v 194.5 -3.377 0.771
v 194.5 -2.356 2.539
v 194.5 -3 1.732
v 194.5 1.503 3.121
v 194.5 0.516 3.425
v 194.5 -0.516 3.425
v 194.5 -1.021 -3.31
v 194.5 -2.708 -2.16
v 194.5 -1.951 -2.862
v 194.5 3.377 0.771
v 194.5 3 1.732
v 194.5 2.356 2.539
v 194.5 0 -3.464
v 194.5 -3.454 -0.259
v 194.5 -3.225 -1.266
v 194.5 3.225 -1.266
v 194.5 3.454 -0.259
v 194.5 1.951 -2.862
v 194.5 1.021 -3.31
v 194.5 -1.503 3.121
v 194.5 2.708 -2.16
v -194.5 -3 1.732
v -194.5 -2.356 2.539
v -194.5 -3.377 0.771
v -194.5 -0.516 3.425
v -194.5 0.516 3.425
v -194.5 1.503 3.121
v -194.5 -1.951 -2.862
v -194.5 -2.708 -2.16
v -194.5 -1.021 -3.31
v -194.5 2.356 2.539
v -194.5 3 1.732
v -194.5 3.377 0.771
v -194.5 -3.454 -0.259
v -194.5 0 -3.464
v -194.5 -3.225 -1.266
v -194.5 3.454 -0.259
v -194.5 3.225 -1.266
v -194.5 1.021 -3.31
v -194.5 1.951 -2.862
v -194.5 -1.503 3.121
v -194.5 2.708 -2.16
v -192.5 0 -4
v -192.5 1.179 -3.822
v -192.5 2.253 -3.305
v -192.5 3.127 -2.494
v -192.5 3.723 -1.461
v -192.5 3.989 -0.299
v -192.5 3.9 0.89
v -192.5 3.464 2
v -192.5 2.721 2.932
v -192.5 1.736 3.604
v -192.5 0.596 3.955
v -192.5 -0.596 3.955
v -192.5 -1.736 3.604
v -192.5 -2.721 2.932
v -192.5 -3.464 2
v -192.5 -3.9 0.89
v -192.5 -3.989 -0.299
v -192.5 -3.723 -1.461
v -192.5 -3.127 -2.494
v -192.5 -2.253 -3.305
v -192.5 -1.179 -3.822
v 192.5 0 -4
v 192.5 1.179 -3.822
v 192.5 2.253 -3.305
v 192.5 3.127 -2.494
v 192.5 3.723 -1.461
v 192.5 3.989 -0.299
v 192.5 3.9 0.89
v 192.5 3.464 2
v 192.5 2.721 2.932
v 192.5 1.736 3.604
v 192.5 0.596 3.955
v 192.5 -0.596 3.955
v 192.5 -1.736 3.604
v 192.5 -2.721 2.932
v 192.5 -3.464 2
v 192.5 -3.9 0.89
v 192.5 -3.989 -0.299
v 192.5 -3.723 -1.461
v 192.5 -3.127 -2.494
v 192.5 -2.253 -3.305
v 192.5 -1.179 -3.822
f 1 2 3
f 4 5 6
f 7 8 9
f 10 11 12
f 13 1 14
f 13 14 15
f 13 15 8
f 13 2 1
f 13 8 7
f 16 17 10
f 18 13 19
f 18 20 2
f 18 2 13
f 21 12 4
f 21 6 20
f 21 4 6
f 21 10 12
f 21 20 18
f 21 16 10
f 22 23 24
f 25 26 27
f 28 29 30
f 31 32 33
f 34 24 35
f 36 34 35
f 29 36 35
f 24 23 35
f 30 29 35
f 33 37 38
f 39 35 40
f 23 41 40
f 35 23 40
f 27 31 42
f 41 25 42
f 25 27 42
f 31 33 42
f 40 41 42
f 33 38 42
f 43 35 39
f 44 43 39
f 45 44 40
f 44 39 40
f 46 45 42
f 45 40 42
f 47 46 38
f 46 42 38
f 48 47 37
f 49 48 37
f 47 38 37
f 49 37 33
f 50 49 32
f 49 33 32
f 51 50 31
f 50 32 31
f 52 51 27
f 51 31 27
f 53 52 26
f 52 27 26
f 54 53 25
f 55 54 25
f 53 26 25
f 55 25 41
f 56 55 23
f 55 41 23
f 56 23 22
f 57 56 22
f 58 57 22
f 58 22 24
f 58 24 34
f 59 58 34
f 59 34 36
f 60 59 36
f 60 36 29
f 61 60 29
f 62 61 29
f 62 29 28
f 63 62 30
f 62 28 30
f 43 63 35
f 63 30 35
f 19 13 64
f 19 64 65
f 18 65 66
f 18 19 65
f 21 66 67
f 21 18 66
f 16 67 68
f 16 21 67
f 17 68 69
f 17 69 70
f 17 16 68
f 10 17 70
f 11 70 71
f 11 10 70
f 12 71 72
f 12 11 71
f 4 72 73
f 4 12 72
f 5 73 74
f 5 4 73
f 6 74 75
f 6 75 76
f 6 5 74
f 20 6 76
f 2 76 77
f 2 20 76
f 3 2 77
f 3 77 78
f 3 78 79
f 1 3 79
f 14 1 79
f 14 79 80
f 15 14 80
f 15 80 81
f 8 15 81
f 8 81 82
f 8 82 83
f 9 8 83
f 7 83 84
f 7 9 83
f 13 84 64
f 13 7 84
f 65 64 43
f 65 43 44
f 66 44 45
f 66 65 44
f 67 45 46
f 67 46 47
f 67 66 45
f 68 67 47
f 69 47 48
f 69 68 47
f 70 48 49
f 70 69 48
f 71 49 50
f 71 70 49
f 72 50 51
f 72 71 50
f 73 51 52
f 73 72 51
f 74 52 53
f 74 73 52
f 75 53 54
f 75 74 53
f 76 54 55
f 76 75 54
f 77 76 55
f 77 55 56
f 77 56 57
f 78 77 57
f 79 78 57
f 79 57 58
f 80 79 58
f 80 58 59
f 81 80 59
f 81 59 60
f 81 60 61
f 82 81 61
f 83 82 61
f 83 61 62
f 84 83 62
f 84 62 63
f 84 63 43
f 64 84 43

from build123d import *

# Parameters (mm, degrees)
SKETCH1_R           = 4
BOSS_EXTRUDE1_DEPTH = 194.5
CHAMFER3_SIZE       = 2
CHAMFER3_SIZE2      = 0.535898385
CHAMFER4_SIZE       = 2
CHAMFER4_SIZE2      = 0.535898385


with BuildPart() as part:
    # Sketch1 → Boss-Extrude1 (new body, symmetric)
    with BuildSketch(Plane(origin=(0, 0, 0), x_dir=(0, 0, -1), z_dir=(1, 0, 0))):
        Circle(SKETCH1_R)
    extrude(amount=BOSS_EXTRUDE1_DEPTH, both=True)

    # Chamfer3
    chamfer3_edges = [part.edges().sort_by_distance(p)[0] for p in [
        (194.5, 0, 4),
    ]]
    chamfer3_side = [part.faces().sort_by_distance(p)[0] for p in [
        (0, 0, 4),
    ]]
    chamfer(chamfer3_edges, length=CHAMFER3_SIZE, length2=CHAMFER3_SIZE2, reference=chamfer3_side[0])

    # Chamfer4
    chamfer4_edges = [part.edges().sort_by_distance(p)[0] for p in [
        (-194.5, 0, 4),
    ]]
    chamfer4_side = [part.faces().sort_by_distance(p)[0] for p in [
        (-1, 0, 4),
    ]]
    chamfer(chamfer4_edges, length=CHAMFER4_SIZE, length2=CHAMFER4_SIZE2, reference=chamfer4_side[0])


solid = part.part
